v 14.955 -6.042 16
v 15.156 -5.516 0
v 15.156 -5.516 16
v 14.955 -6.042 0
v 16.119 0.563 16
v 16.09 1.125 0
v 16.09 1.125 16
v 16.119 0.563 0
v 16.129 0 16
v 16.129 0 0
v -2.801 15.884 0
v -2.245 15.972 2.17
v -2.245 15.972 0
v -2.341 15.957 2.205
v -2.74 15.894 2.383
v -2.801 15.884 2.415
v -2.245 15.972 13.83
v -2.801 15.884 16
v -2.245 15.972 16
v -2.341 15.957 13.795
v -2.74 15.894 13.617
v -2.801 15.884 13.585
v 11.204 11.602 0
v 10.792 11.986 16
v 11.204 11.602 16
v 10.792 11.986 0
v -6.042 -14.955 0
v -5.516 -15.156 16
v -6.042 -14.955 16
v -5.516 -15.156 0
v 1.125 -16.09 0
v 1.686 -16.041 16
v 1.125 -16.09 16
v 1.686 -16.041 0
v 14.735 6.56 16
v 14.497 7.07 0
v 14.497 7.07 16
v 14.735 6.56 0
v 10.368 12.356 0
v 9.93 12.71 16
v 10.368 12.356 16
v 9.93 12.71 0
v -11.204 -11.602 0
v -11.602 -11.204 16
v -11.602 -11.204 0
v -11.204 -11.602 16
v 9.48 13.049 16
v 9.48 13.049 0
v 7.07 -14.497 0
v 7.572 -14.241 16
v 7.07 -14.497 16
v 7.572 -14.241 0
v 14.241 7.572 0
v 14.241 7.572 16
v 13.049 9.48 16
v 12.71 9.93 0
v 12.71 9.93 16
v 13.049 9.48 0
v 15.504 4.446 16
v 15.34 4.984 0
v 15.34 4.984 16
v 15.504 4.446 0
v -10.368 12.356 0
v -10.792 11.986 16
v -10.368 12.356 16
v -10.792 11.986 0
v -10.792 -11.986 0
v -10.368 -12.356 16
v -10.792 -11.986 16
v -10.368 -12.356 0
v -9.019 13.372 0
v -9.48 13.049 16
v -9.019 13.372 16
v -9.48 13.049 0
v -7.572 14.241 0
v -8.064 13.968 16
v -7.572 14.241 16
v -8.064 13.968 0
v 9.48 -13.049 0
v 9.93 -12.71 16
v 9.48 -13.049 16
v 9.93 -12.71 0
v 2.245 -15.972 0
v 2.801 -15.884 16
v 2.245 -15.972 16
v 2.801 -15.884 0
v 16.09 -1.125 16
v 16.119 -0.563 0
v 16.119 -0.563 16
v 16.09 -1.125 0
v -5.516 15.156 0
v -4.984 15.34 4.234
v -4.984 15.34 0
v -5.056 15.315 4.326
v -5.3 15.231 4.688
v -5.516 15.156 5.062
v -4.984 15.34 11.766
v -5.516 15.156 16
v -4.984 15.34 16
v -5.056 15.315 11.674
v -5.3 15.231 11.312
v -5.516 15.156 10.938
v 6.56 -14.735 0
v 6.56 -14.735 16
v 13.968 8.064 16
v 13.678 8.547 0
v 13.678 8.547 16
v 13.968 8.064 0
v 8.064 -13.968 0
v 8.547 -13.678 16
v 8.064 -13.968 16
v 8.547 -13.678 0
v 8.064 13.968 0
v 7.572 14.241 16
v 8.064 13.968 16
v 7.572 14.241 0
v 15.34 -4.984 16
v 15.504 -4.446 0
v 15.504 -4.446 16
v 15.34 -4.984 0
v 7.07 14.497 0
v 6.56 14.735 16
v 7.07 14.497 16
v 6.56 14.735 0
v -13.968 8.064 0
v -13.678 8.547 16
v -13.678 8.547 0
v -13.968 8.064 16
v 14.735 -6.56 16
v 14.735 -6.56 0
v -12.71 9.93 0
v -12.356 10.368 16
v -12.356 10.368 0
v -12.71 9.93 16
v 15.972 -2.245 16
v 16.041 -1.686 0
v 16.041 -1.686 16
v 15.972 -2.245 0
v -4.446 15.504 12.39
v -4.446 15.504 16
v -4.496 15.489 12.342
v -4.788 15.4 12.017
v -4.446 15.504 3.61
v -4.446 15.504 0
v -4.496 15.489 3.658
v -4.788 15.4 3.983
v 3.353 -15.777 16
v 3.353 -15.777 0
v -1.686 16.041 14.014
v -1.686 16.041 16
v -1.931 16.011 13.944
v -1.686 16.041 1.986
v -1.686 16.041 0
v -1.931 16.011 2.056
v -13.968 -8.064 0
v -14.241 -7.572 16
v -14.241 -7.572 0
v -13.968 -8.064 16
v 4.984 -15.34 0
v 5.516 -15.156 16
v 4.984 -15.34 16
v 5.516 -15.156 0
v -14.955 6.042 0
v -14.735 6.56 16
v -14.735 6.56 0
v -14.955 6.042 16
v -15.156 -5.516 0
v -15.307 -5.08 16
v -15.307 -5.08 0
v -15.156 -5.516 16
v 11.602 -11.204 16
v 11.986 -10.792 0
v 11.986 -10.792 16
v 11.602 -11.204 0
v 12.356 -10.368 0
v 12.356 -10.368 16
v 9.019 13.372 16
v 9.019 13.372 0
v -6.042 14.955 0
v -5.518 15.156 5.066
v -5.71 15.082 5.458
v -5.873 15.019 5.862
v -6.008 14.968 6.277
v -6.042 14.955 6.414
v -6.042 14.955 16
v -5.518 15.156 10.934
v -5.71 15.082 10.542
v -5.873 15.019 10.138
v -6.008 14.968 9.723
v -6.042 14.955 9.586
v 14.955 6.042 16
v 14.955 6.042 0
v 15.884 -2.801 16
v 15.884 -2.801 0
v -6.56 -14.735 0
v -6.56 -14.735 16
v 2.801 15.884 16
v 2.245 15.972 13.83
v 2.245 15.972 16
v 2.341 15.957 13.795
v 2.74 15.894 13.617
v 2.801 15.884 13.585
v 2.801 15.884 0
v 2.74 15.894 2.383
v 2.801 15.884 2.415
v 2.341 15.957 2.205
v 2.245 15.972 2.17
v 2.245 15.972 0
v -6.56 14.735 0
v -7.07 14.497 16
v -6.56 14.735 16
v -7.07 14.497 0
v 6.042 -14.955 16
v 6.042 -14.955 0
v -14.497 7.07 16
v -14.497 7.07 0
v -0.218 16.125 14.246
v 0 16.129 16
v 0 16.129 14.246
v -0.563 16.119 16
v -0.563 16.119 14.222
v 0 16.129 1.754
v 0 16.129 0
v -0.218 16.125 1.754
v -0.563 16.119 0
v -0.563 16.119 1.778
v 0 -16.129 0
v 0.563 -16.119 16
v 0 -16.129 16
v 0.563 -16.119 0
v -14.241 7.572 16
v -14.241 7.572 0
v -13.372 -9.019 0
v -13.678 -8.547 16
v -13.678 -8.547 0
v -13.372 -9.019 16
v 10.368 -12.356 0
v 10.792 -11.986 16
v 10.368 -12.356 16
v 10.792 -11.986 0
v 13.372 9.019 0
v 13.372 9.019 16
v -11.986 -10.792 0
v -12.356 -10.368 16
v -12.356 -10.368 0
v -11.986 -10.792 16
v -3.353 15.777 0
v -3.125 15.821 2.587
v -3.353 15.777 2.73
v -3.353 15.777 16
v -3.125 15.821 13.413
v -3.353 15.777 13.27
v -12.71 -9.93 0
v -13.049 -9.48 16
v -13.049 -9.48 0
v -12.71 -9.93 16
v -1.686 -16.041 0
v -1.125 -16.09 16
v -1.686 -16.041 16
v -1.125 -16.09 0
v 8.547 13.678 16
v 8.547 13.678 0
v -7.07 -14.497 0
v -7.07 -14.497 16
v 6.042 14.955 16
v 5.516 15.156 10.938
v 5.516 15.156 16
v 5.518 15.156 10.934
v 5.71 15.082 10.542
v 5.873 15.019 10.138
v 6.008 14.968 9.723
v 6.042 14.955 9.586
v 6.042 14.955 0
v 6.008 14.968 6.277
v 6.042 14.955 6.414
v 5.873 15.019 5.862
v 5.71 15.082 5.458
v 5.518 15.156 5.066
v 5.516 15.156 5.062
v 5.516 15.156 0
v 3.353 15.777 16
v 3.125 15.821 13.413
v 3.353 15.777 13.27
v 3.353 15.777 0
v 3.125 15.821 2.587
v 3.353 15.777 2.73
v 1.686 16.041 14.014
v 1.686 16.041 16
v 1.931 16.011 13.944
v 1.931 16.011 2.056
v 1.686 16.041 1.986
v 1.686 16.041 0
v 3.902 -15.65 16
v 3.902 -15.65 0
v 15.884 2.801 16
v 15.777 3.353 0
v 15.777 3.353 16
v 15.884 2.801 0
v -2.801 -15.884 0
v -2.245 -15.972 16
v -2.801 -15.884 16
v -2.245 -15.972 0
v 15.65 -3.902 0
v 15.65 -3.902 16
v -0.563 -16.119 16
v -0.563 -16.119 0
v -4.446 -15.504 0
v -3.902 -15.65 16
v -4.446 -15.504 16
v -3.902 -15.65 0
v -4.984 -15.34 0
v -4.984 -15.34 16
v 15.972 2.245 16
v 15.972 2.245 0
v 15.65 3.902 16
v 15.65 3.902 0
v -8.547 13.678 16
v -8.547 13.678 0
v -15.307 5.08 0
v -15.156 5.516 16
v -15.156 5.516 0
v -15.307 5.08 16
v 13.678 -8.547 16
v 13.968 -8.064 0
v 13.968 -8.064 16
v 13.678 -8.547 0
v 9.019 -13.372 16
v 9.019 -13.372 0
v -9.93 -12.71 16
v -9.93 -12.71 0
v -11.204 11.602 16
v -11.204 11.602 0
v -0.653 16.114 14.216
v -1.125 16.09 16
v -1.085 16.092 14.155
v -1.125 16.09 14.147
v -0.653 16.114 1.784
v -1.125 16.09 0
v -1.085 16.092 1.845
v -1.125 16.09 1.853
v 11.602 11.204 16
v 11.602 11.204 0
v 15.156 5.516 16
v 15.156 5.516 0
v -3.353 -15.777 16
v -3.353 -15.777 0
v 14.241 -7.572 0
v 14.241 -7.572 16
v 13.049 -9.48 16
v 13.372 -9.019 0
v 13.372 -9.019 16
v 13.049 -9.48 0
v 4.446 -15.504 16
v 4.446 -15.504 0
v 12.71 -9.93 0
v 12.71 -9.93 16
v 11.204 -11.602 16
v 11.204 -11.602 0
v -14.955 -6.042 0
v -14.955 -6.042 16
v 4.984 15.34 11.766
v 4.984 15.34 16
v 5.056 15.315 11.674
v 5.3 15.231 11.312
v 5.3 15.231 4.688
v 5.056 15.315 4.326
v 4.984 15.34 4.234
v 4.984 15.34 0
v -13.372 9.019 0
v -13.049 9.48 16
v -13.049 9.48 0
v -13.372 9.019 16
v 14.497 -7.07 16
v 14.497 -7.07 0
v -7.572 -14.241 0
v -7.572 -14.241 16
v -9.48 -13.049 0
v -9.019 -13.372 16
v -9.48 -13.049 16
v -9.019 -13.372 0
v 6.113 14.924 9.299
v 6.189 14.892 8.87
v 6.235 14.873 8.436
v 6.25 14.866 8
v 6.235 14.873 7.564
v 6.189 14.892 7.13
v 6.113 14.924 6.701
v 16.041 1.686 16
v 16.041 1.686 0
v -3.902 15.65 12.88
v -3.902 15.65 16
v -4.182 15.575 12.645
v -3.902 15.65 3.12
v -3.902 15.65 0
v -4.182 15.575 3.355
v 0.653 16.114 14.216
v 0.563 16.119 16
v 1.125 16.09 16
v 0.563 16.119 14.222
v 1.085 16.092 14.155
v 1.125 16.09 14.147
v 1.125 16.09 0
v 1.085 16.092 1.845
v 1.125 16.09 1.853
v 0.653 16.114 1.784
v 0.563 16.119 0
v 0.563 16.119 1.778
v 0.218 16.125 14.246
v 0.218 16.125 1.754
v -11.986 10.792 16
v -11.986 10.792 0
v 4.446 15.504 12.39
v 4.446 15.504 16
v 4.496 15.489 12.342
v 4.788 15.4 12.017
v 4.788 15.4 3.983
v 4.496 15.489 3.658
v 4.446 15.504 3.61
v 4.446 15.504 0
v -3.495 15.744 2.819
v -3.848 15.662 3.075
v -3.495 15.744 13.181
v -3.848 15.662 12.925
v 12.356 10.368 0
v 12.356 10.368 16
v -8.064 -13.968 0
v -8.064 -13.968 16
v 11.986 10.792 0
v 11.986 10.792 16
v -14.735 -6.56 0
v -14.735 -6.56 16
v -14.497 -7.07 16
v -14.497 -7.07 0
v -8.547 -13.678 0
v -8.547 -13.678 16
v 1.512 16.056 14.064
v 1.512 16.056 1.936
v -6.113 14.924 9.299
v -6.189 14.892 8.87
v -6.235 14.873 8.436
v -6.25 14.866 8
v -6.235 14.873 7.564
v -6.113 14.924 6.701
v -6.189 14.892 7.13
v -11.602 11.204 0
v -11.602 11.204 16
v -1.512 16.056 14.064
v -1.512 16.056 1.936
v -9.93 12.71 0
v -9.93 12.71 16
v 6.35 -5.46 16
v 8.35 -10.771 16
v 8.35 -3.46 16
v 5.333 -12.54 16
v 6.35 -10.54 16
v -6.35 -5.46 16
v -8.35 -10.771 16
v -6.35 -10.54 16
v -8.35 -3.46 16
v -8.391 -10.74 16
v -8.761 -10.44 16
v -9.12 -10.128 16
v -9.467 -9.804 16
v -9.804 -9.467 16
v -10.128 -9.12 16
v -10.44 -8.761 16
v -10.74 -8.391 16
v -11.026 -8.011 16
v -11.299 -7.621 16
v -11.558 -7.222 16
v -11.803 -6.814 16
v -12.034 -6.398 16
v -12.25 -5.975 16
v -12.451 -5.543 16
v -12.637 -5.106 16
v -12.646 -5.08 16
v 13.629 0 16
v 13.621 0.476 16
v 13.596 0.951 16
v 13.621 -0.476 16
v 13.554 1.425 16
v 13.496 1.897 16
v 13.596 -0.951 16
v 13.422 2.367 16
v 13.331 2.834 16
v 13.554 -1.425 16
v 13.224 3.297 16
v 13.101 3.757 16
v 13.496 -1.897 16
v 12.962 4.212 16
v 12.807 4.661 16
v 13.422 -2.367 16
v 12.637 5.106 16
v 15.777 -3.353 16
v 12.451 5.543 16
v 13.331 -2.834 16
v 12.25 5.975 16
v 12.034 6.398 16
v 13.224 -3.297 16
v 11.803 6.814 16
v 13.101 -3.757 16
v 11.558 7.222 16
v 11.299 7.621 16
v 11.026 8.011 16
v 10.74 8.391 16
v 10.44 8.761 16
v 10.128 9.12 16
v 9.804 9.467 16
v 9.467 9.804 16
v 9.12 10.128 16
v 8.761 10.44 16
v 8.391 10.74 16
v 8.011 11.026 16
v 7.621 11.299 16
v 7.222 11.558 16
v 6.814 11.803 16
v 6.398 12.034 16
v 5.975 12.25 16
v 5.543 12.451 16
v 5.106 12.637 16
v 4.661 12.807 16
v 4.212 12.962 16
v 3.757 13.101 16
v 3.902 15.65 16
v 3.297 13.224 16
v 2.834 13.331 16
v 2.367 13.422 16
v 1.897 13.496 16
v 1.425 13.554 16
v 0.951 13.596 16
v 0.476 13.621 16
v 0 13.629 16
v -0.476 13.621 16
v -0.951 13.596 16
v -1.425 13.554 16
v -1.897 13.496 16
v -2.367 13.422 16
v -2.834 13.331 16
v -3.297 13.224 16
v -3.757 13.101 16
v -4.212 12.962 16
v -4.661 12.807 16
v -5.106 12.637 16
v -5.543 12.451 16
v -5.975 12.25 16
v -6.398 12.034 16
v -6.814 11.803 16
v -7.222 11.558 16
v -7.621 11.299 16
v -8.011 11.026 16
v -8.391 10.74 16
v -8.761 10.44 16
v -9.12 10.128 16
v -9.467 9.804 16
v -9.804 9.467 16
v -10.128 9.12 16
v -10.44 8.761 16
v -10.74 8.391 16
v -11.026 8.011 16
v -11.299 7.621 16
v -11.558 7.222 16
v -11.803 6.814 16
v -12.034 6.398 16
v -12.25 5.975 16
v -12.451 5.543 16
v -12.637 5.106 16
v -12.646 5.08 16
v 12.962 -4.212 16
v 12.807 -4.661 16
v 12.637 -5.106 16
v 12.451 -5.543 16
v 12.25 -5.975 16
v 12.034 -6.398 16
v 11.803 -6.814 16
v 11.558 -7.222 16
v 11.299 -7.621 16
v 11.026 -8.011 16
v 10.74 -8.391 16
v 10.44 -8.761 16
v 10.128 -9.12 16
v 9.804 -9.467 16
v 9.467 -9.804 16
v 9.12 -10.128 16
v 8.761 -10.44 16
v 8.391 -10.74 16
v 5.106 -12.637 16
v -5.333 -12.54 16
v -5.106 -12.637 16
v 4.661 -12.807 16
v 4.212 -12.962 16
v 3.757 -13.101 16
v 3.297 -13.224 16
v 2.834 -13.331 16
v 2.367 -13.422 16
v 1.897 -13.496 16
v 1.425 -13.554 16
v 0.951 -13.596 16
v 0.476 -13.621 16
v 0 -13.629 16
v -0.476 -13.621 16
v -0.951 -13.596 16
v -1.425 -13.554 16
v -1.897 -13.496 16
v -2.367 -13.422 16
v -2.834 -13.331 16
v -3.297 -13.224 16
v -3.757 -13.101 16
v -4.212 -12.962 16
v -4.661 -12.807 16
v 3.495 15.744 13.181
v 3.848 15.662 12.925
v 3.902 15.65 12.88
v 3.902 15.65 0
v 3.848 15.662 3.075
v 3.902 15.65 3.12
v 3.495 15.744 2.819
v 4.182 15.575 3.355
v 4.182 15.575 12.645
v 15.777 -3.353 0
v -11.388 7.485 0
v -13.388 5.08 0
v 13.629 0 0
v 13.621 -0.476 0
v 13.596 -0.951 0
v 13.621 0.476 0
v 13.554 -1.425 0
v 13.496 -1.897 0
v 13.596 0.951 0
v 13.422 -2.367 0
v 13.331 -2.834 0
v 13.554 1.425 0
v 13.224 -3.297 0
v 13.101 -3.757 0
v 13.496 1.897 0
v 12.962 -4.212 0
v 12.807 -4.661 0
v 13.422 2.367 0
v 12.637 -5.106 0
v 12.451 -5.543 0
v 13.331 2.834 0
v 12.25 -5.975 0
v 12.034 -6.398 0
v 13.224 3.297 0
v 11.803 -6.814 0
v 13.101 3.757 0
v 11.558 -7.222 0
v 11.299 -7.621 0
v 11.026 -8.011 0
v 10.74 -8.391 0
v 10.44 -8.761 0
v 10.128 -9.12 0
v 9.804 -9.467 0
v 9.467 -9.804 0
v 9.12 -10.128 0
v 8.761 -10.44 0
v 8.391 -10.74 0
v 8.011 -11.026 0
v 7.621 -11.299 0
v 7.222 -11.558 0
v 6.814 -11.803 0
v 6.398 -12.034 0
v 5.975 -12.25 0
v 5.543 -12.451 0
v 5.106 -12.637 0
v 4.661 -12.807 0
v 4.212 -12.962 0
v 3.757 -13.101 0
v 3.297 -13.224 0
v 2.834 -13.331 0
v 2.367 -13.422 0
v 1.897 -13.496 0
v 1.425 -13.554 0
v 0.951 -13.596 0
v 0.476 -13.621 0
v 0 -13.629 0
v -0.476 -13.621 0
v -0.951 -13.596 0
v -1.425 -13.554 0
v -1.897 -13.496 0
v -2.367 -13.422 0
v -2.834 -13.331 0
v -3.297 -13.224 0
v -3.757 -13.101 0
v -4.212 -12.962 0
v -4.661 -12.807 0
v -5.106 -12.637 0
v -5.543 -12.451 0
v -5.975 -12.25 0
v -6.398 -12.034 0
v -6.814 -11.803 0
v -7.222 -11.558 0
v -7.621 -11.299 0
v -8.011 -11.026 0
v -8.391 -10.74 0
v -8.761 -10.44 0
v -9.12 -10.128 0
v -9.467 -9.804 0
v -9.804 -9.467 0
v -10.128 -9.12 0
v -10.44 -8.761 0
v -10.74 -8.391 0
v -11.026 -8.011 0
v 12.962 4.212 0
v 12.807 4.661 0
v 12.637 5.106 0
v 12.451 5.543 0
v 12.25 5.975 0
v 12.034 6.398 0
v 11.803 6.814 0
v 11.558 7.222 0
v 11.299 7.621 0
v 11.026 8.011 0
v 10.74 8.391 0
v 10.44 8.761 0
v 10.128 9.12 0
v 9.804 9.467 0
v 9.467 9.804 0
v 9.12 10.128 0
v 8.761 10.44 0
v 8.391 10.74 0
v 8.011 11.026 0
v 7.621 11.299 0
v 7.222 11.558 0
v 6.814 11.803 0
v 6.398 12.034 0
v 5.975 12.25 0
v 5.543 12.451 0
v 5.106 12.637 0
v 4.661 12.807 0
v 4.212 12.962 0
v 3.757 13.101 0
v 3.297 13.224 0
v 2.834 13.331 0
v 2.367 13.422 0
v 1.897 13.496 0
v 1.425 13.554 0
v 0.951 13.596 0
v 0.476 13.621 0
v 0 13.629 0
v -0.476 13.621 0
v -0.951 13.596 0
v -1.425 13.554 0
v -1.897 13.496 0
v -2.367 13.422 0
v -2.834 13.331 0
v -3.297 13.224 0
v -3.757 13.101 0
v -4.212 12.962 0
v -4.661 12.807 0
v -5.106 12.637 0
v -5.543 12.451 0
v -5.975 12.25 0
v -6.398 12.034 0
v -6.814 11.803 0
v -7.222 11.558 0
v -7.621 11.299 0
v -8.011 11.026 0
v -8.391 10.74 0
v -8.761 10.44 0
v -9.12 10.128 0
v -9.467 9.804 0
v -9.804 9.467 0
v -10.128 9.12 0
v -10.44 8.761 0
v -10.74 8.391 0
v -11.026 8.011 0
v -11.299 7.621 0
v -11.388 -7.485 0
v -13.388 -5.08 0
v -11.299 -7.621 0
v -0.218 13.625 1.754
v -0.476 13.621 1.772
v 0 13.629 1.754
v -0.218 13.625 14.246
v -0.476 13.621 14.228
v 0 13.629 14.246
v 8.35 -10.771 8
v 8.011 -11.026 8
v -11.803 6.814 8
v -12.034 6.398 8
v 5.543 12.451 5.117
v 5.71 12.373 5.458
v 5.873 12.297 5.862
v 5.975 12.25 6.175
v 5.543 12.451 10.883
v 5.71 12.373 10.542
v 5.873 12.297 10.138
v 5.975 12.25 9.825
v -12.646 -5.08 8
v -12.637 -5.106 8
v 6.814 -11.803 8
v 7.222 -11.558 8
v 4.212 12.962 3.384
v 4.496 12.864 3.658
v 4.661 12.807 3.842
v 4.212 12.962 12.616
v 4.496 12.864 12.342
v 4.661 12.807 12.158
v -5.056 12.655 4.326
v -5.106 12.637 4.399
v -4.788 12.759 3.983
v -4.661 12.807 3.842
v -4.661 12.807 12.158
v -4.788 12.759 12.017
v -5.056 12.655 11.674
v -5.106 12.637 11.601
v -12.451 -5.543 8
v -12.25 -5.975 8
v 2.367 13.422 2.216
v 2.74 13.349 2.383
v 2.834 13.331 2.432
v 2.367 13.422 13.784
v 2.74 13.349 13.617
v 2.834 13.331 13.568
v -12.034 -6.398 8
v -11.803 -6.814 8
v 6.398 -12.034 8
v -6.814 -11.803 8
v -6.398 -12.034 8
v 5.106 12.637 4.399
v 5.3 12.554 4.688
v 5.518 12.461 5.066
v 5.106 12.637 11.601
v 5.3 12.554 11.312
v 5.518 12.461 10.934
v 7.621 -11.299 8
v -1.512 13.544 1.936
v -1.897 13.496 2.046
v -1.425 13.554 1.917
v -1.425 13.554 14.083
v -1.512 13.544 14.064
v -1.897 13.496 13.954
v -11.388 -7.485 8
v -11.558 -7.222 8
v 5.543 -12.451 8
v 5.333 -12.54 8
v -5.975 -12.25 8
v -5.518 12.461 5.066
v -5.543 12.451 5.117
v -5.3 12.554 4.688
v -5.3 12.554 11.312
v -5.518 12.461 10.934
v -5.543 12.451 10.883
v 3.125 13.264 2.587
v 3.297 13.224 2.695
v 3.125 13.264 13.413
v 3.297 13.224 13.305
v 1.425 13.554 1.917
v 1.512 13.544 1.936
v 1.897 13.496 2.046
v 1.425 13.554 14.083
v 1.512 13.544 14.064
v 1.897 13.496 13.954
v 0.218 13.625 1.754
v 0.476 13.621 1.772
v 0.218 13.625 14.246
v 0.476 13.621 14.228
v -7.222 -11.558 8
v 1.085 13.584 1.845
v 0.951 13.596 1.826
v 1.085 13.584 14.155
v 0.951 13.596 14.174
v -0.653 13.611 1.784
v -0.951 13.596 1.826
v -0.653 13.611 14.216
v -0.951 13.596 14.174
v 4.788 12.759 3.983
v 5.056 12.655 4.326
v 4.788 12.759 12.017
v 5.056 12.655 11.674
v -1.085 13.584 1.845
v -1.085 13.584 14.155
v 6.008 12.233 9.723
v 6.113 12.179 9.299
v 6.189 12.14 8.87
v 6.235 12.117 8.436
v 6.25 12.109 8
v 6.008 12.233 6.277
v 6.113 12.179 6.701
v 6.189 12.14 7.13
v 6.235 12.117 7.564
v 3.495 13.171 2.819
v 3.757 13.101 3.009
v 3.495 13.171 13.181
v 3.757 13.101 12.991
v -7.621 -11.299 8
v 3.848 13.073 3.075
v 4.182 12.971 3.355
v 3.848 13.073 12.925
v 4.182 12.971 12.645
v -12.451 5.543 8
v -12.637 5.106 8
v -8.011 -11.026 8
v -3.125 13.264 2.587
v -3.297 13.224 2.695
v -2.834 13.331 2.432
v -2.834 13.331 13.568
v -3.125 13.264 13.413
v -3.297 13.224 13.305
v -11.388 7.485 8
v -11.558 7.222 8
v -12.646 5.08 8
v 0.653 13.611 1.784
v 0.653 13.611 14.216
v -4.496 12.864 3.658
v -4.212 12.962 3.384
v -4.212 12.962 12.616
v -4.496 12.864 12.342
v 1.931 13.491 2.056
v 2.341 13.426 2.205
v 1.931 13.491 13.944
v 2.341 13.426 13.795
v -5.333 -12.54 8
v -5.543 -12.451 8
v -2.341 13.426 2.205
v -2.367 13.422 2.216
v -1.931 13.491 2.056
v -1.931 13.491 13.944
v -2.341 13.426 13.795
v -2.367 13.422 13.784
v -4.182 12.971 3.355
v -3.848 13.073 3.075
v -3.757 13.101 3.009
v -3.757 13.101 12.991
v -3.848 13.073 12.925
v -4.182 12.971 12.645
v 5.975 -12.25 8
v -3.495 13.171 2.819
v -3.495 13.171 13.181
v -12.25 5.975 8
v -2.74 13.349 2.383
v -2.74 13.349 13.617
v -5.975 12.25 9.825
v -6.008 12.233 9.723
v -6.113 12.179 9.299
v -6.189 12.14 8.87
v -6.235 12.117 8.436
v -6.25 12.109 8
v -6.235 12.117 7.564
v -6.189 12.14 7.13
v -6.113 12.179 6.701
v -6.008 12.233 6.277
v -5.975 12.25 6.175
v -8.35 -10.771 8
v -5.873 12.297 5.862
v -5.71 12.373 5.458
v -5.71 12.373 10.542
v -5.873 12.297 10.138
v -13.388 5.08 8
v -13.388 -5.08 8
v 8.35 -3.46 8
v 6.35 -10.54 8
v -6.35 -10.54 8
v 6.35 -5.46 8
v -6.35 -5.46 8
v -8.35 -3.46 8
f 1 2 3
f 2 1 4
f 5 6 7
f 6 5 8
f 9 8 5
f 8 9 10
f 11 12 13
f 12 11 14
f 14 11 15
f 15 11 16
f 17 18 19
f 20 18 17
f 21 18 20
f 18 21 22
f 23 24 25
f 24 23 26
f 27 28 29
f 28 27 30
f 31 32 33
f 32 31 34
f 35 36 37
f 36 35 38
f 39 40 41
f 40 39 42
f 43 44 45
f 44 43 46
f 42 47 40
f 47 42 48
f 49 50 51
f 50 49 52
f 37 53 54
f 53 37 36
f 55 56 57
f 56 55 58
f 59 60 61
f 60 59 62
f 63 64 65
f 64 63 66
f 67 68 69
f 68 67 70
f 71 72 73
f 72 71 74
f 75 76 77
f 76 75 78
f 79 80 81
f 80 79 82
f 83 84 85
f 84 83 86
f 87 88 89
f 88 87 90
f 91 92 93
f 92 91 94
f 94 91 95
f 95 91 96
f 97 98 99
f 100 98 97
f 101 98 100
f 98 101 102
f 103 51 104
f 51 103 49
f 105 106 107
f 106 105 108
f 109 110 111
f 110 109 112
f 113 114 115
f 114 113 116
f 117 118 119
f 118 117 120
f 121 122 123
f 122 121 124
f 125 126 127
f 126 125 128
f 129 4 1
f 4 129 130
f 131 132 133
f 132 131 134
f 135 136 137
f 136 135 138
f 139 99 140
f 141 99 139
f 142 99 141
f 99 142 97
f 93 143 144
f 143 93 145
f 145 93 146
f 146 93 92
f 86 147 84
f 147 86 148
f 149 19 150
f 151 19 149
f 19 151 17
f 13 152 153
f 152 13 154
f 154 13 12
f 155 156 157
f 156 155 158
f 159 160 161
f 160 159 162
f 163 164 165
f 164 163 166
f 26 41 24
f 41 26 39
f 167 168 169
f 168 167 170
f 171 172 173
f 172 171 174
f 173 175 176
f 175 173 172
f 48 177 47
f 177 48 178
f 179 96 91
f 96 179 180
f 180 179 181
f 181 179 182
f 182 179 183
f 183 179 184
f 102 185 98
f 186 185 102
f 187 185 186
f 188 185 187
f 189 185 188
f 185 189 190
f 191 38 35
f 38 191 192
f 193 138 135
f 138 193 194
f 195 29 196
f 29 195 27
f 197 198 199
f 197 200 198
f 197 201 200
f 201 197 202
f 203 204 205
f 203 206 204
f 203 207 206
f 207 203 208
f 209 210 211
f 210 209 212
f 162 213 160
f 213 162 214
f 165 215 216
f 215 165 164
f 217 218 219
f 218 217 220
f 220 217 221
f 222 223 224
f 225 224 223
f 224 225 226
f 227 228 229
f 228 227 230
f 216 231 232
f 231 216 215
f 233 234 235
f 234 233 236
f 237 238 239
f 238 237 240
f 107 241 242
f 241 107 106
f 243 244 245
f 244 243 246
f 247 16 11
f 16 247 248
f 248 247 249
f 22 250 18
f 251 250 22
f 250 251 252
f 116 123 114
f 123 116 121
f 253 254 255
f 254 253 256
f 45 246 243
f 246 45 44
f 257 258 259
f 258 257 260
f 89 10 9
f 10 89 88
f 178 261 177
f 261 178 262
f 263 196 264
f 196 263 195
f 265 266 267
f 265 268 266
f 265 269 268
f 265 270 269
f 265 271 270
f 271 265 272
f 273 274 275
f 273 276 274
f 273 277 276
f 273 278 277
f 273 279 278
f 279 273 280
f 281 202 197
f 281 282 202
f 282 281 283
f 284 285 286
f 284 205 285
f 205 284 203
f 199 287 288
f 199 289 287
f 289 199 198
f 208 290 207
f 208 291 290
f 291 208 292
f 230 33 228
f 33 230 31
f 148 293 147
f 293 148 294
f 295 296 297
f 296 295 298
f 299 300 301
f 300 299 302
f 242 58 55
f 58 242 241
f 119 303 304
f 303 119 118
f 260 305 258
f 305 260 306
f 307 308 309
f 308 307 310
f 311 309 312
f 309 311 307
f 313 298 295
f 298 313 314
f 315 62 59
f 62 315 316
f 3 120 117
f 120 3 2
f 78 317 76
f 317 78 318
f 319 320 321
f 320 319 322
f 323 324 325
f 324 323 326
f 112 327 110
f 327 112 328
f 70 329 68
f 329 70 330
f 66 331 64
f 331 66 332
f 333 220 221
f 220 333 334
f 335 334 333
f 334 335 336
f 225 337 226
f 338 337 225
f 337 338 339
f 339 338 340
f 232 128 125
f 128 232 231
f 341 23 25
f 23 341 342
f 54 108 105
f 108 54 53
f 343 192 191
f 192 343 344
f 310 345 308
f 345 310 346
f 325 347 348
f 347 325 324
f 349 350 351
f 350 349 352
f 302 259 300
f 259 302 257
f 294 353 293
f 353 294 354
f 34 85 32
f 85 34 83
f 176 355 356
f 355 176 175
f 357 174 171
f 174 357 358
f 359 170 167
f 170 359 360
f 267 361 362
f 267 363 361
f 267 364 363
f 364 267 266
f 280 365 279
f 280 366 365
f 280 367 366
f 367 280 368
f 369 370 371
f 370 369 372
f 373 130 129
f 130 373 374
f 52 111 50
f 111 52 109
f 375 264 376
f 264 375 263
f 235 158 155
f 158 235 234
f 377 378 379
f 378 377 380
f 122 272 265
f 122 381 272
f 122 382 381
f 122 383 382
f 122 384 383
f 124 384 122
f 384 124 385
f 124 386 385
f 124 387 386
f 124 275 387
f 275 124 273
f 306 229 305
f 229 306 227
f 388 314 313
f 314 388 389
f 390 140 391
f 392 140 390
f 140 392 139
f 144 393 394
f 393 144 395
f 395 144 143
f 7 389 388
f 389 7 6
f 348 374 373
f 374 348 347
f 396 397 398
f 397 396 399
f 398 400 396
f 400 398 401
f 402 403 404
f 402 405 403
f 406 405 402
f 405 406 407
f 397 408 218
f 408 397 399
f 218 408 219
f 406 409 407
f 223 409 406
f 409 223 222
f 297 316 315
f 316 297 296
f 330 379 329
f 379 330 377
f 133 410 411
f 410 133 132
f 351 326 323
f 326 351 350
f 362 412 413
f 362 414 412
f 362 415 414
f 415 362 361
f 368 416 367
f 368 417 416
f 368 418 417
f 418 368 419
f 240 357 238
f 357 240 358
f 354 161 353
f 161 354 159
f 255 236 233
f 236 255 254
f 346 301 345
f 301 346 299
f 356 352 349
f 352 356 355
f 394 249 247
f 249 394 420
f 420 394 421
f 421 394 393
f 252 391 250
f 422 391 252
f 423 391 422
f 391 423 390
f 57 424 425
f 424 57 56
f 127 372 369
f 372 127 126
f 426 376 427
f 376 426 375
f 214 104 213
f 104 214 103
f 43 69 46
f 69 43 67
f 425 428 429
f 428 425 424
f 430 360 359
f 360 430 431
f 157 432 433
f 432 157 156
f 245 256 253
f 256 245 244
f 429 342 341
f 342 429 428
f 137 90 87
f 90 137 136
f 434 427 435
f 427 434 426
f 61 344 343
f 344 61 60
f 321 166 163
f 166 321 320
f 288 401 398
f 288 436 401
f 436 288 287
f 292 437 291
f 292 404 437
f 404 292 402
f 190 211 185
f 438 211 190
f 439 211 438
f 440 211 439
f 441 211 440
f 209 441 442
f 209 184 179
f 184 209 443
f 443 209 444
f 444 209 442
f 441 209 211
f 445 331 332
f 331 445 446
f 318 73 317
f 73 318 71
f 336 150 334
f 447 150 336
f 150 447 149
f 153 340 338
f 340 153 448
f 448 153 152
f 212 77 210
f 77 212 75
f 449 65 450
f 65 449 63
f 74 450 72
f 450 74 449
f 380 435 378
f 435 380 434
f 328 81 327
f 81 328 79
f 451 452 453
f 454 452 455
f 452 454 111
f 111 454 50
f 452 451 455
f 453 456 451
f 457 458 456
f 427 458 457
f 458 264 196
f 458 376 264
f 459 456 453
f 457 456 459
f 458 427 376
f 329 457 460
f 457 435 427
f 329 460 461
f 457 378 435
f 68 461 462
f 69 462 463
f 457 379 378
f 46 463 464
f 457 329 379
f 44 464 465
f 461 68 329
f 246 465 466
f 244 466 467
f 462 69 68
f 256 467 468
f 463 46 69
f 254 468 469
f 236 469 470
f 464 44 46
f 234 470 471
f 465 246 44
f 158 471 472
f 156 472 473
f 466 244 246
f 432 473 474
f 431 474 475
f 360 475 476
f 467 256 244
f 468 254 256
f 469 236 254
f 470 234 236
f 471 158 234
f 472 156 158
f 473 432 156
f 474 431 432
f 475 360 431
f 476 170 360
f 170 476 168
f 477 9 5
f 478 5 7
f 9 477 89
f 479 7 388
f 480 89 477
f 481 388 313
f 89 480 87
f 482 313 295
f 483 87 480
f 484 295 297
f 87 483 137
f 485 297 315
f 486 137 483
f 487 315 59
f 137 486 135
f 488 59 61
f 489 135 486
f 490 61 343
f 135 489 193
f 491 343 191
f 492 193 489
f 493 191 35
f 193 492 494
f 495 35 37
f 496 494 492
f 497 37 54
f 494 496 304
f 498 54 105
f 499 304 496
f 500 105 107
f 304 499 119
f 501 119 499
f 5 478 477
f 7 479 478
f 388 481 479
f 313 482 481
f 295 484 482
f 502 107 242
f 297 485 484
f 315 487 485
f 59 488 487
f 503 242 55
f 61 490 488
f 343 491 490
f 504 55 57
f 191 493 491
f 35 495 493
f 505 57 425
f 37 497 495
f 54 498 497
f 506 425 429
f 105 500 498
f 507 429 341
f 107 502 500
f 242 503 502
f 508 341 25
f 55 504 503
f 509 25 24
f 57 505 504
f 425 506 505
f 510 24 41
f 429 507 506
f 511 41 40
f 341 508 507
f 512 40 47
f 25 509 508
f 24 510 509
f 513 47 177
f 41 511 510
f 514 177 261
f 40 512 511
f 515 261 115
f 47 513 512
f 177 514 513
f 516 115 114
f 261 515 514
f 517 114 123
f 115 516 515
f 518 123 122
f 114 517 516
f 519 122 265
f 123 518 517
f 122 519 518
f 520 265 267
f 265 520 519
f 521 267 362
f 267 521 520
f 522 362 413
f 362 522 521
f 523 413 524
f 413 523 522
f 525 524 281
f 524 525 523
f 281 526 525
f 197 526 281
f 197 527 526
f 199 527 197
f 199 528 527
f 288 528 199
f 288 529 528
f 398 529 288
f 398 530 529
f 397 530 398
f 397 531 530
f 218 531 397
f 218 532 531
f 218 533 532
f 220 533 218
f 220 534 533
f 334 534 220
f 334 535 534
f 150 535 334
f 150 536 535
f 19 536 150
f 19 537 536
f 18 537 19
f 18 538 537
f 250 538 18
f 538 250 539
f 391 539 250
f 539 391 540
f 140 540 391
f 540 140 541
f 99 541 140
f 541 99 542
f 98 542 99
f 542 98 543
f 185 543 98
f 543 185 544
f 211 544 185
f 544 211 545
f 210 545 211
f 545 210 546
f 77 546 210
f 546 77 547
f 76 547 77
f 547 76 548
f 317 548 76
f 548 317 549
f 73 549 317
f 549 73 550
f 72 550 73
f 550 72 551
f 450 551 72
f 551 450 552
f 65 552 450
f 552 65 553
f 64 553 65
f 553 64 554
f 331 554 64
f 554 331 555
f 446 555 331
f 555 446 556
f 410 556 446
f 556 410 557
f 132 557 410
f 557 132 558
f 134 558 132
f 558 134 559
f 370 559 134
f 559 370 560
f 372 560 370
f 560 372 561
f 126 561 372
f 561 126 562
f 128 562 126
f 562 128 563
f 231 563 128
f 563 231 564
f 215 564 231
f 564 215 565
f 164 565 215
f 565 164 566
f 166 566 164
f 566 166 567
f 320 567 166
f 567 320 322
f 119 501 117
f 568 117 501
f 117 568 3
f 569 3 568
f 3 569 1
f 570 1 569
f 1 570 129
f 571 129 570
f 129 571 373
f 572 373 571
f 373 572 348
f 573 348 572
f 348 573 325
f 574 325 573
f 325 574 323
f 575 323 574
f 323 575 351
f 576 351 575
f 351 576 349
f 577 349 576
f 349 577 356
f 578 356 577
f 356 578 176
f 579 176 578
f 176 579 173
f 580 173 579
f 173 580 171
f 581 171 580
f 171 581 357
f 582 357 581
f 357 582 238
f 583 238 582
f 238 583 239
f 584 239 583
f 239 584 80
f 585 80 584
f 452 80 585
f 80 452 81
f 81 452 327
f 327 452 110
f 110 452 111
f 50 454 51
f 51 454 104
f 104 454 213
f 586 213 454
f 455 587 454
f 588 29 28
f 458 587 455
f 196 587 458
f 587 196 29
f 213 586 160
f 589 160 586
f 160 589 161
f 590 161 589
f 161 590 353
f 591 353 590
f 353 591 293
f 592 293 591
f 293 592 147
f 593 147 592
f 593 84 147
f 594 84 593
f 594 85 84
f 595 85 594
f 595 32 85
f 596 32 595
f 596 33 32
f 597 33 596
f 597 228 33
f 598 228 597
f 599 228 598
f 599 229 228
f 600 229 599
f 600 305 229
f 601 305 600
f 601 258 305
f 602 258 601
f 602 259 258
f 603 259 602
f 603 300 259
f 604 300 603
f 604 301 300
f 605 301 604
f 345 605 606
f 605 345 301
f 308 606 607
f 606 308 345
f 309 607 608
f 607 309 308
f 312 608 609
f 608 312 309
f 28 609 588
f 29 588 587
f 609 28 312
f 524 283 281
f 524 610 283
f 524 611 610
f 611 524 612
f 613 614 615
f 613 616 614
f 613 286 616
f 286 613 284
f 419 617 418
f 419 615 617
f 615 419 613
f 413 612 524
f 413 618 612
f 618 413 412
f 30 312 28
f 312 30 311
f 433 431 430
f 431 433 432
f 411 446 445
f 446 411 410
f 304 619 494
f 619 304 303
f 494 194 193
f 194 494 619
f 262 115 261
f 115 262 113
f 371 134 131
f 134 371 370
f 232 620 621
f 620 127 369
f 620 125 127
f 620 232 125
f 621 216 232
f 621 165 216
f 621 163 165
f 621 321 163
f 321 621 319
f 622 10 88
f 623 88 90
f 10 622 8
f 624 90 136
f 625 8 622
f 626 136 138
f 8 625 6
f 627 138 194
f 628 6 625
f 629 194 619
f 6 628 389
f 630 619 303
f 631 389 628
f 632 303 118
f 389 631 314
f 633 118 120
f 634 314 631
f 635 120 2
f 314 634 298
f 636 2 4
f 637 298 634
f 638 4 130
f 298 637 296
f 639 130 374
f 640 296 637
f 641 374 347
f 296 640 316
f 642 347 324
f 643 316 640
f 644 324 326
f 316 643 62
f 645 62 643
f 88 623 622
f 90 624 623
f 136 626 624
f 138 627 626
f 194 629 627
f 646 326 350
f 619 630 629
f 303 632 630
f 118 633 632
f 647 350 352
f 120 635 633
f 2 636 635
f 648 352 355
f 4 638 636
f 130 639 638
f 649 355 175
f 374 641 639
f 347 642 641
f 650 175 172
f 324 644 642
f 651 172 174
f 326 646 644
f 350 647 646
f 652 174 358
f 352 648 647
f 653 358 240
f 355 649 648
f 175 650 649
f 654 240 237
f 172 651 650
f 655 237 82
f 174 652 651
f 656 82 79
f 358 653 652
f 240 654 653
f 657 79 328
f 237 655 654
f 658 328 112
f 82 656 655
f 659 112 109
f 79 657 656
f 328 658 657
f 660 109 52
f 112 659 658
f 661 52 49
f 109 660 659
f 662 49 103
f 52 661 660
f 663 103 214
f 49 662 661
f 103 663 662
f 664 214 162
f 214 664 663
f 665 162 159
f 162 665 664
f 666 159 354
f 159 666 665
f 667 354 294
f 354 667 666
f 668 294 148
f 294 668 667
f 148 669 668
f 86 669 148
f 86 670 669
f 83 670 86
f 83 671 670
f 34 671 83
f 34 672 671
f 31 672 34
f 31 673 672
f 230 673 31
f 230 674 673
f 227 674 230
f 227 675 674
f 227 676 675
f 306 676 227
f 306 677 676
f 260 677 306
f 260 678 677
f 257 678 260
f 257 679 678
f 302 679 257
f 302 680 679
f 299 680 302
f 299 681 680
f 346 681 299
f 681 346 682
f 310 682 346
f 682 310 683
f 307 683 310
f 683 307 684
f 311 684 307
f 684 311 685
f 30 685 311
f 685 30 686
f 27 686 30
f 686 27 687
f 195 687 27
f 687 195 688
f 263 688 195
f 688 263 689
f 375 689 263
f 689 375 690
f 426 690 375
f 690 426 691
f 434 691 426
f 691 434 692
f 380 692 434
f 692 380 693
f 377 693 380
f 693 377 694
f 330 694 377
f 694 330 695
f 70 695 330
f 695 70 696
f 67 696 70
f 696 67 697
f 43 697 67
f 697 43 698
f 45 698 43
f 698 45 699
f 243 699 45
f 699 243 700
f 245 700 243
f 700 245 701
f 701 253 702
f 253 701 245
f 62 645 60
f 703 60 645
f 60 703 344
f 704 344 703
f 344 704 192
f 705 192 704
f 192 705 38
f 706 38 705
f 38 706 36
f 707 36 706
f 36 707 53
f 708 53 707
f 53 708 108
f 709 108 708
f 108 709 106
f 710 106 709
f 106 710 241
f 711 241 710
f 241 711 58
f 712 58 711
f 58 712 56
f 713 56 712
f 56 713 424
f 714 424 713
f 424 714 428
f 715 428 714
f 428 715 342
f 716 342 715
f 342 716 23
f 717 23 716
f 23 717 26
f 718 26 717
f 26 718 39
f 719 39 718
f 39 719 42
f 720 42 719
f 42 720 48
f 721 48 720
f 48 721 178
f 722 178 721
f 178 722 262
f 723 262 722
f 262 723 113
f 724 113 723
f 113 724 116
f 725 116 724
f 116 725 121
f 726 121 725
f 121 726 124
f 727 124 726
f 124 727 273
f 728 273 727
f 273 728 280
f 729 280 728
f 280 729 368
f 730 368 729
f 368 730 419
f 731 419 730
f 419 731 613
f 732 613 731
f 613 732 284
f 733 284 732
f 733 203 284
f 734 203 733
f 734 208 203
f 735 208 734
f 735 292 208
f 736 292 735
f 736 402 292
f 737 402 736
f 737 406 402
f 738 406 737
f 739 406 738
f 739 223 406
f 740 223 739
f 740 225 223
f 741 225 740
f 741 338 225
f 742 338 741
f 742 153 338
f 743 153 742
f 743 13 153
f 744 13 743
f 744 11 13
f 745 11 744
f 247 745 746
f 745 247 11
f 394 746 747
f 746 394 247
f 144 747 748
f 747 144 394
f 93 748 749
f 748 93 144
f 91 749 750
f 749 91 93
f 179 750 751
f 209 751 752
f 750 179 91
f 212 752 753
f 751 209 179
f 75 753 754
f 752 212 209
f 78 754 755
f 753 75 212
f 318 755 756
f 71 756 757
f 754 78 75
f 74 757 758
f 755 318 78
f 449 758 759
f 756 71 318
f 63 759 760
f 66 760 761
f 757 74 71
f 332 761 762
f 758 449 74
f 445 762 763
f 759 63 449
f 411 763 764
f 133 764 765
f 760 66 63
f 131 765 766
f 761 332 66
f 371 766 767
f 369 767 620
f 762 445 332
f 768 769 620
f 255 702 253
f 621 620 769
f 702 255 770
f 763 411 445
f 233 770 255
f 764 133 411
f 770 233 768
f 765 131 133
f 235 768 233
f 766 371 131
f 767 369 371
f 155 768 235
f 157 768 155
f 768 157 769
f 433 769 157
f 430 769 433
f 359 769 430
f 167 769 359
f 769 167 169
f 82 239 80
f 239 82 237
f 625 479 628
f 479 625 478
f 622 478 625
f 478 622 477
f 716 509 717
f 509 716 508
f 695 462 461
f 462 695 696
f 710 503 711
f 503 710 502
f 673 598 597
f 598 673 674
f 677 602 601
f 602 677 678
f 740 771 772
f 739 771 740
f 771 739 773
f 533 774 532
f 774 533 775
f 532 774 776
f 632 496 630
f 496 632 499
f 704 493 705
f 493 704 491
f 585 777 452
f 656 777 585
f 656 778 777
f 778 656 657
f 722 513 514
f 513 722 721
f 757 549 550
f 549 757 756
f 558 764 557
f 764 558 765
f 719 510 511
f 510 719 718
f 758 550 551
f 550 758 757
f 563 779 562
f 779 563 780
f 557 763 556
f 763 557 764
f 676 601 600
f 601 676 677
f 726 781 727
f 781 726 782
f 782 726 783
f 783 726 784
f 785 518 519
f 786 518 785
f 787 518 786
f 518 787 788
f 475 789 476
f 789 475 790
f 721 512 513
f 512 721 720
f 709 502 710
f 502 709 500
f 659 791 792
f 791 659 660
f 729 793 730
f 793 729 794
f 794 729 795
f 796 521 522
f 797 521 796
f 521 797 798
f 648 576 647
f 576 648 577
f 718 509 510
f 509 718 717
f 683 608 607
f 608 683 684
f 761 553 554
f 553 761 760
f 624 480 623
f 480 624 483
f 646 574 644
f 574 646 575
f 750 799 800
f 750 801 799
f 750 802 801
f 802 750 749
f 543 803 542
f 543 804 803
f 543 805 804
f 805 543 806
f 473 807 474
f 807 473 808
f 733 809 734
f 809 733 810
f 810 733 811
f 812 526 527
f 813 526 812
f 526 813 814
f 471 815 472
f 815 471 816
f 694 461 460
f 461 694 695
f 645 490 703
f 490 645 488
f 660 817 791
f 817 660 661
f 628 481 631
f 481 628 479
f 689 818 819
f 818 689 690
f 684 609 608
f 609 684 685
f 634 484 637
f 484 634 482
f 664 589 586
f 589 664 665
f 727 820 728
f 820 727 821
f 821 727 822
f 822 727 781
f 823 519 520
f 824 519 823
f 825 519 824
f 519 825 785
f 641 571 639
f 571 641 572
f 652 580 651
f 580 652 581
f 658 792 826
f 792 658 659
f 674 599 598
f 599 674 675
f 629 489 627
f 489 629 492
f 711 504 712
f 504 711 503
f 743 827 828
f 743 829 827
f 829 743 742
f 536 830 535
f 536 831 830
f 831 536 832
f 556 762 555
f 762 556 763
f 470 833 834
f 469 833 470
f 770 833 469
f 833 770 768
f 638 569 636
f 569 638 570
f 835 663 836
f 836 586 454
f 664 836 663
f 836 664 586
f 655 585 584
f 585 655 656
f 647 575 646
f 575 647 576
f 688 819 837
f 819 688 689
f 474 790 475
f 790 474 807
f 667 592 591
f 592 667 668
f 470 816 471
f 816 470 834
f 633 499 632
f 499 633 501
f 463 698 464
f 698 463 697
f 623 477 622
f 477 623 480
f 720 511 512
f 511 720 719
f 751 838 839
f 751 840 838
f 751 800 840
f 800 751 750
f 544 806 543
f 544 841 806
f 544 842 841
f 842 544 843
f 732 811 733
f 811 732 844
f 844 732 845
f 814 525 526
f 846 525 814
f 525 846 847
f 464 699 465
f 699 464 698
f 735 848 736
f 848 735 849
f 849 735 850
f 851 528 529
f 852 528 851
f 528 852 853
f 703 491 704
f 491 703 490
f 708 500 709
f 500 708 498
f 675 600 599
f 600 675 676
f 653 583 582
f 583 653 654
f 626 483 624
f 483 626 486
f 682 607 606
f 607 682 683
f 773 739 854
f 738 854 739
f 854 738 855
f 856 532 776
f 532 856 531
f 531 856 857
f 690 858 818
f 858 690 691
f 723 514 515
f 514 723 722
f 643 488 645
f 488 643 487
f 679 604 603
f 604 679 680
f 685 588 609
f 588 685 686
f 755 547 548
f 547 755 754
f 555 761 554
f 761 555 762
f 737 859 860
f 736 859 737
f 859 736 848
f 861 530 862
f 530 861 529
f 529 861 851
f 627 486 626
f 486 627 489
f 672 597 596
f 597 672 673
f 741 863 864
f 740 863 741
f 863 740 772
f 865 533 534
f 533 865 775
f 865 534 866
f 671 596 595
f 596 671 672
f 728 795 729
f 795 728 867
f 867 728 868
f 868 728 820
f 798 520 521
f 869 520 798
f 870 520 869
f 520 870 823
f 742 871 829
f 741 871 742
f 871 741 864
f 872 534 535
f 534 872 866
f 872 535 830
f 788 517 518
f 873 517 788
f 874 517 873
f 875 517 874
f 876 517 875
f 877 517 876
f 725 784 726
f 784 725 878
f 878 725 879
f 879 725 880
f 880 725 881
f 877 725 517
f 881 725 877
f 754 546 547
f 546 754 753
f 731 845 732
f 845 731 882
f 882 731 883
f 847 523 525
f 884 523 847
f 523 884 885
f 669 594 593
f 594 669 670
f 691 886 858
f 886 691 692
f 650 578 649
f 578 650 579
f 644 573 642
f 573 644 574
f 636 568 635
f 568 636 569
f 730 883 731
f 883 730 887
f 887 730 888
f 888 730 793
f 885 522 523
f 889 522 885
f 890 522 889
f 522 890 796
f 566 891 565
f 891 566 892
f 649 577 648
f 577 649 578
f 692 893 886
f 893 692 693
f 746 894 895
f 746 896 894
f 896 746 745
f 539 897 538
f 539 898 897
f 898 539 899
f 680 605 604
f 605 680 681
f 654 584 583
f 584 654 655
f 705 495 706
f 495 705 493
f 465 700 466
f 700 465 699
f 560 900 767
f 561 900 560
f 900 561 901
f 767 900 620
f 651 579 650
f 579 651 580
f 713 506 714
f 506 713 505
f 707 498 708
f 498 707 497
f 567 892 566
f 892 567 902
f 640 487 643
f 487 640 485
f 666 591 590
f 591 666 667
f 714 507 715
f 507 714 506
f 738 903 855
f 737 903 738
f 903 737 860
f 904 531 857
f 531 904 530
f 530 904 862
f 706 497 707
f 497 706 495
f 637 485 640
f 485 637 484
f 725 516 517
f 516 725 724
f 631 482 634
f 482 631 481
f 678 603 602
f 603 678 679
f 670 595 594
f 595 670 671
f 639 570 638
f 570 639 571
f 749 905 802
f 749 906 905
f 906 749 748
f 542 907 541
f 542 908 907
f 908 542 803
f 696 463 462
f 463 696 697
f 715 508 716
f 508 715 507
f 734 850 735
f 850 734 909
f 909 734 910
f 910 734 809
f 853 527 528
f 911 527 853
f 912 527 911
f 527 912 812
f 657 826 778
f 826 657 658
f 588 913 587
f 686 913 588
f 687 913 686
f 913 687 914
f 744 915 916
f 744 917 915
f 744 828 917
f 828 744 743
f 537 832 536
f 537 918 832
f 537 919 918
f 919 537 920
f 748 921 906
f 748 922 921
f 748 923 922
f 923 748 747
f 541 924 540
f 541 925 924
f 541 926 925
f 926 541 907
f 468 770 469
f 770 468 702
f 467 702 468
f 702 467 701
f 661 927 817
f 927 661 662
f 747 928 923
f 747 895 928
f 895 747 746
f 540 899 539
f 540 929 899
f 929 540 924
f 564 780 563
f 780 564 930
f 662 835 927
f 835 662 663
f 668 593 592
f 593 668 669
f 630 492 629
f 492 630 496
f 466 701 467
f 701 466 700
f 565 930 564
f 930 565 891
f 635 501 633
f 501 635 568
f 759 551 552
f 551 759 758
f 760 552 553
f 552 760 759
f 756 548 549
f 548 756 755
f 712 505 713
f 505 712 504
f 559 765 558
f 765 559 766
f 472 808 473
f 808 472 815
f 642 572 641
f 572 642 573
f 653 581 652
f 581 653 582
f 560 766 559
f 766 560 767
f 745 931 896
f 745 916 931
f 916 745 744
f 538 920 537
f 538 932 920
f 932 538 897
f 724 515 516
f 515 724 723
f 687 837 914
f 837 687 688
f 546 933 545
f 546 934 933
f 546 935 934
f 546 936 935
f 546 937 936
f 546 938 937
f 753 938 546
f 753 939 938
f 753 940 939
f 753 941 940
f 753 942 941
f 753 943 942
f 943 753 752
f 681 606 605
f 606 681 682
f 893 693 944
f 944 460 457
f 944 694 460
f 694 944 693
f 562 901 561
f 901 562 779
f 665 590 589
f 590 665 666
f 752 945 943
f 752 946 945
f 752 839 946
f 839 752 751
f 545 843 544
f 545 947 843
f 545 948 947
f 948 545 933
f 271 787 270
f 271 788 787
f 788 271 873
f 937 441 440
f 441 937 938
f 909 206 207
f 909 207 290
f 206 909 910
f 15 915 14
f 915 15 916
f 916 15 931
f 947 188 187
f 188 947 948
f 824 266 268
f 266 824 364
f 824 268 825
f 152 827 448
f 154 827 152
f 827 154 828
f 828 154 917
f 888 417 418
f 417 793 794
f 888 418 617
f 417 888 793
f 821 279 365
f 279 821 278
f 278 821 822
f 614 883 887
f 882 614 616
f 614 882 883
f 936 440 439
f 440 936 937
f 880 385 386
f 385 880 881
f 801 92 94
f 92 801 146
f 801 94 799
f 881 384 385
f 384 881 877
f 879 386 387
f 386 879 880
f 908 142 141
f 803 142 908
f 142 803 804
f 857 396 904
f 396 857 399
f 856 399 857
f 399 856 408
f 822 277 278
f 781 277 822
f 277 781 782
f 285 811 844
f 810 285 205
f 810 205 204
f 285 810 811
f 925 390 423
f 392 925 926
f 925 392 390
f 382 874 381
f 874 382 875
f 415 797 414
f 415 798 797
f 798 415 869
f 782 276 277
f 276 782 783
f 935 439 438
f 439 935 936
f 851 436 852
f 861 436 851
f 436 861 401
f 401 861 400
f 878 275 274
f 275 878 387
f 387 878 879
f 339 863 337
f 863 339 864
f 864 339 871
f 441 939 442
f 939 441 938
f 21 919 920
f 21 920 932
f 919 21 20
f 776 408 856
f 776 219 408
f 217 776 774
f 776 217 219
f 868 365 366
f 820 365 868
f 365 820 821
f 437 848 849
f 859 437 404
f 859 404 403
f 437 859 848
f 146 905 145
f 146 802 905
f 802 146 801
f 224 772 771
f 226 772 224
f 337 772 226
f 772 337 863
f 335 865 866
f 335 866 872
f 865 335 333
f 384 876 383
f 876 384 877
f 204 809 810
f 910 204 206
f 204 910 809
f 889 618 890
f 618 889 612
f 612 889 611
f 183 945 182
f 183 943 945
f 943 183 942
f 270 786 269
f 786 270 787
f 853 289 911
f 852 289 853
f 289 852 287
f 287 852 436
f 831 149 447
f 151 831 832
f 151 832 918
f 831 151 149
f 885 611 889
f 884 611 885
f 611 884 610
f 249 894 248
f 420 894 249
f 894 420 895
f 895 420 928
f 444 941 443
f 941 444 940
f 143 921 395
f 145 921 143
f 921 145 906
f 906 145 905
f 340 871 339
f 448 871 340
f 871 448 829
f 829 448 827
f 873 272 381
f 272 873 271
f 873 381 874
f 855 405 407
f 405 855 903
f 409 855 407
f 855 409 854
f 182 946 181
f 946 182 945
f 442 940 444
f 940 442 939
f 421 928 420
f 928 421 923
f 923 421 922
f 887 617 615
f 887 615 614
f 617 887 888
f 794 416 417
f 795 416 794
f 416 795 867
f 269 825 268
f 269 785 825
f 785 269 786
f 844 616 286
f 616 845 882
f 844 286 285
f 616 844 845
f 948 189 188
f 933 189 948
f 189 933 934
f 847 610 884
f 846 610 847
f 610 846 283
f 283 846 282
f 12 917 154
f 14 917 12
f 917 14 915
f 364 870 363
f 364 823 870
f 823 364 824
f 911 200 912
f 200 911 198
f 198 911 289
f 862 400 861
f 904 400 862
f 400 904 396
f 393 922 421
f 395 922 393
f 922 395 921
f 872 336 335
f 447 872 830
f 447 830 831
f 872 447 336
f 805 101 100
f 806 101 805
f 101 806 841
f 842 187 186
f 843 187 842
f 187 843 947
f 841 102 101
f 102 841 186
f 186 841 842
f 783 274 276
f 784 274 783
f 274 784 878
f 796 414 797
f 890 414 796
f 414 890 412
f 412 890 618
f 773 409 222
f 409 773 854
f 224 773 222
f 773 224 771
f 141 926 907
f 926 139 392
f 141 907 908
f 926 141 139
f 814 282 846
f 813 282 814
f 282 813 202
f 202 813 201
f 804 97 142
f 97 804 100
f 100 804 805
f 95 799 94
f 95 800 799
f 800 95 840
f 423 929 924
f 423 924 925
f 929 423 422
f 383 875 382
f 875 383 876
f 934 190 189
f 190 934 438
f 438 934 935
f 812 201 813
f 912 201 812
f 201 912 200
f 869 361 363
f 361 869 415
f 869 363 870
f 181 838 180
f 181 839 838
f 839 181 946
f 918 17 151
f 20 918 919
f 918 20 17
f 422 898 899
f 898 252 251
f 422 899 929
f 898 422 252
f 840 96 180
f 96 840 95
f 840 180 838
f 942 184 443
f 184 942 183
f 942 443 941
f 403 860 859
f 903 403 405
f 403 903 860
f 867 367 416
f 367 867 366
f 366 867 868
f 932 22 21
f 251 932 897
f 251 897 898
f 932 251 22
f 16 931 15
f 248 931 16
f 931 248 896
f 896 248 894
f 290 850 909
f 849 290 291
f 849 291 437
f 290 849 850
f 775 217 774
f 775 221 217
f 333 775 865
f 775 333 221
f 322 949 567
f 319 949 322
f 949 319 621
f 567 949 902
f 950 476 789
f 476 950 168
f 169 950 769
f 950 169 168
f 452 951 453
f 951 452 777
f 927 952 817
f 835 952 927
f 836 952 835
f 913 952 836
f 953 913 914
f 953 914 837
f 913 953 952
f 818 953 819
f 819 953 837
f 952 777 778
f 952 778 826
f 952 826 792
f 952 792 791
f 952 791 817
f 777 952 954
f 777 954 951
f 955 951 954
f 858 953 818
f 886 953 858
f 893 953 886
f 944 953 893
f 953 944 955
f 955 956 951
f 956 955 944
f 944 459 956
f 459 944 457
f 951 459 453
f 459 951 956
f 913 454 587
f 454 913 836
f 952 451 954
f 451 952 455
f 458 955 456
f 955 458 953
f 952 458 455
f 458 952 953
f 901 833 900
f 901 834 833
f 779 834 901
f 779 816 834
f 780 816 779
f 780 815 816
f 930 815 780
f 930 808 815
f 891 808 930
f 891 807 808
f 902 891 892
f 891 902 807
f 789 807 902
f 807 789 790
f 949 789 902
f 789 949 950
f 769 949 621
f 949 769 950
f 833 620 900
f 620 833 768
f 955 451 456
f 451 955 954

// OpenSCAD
// file: dim.scad
FACES = 180;
EPSILON = 0.1;
VERSION_MAJOR = 1;
VERSION_MINOR = 0;

INCHES_TO_MM = 25.4;
MM_TO_INCHES = 1 / INCHES_TO_MM;

// inner diameter of the lightsaber tube.
// shock is constant, within tolerances
D_INNER      		= 32.258;    // 1.225 -> 1.250 -> 1.270
R_INNER = D_INNER / 2;

// dimensions of the main ring.
H_RING = 16;
T_RING = 2.5;

// dimensions of pin holders and pins
PIN	   = 2.54;
H_PIN_HOLDER = 8;
T_PIN_HOLDER_WALL = 2;

// Pin counts:
X_EMITTER = 4;
Y_EMITTER = 1;


H_BUTTRESS			= 0.175 * INCHES_TO_MM;
D_BATTERY			= 0.732 * INCHES_TO_MM;

W_PCB				= 0.70 * INCHES_TO_MM;
H_PCB				= 0.08 * INCHES_TO_MM;

W_OUTER_DISPLAY		= 0.91 * INCHES_TO_MM;
W_INNER_DISPLAY		= 0.47 * INCHES_TO_MM;
H_OUTER_DISPLAY		= 0.08 * INCHES_TO_MM;
H_INNER_DISPLAY		= 0.14 * INCHES_TO_MM;

D_SWITCH			= 12.5;						// actually 12, by thread.

D_ROD				= 0.160 * INCHES_TO_MM;
ROD_GAP 			= 0.050 * INCHES_TO_MM;

OFFSET_EMITTER = -PIN + sqrt(R_INNER * R_INNER - PIN * PIN * Y_EMITTER * Y_EMITTER);

module emitterPin(h)
{
    translate([-X_EMITTER * PIN / 2, OFFSET_EMITTER, 0]) {
        cube([X_EMITTER * PIN, PIN, h]);
    }	
}
// file: ../shapes.scad
FACES = 180;
EPSILON = 0.1;

module tube(_h, _rInner, _rOuter) {
	difference() {
		cylinder(h=_h, r=_rOuter, $fn=FACES);
		translate([0,0,-EPSILON]) {
			cylinder(h=_h + EPSILON*2, r=_rInner, $fn=FACES);
		}
	}
}

module shelf(_r0, _h, _r1) {
	rotate_extrude($fn=FACES) {
		polygon([[_r0, 0], [_r1, _h], [_r0, _h]]);
	}
}
// main file
use <../threads.scad>
use <../shapes.scad>
include <dim.scad>

$fn = 90;

X_MC = 5;
Y_MC = 2;
OFFSET_MC = 8;
	
module port(xPins, yPins, drawOuter)
{
	INNER_WIDTH  = xPins * PIN;
	INNER_HEIGHT = yPins * PIN;
	OUTER_WIDTH  = INNER_WIDTH  + T_PIN_HOLDER_WALL * 2;
	OUTER_HEIGHT = INNER_HEIGHT + T_PIN_HOLDER_WALL * 2; 

	translate([-OUTER_WIDTH/2, -OUTER_HEIGHT/2, 0]) {
		if (drawOuter) {
			difference() {
				cube(size=[OUTER_WIDTH, OUTER_HEIGHT, H_PIN_HOLDER]);
				translate([T_PIN_HOLDER_WALL, T_PIN_HOLDER_WALL, -1]) {
					cube(size=[INNER_WIDTH, INNER_HEIGHT, H_PIN_HOLDER + 2]);
				}
			}
		}	
		else {
			translate([T_PIN_HOLDER_WALL, T_PIN_HOLDER_WALL, -10]) {
				cube(size=[INNER_WIDTH, INNER_HEIGHT, H_PIN_HOLDER + 20]);
			}
		}
	}
}

difference() 
{
	union() {
		difference() {
			tube(H_RING, D_INNER/2 - T_RING, D_INNER/2);
			translate([0, 0, H_RING/2]) {
				rotate([-90, 0, 0]) {
					cylinder(d=D_SWITCH, h=D_INNER/2 + 1);
				}
			}
            rotate([0, 0, 90]) {
                translate([-X_EMITTER * PIN / 2, 0, -1]) {
                    cube([X_EMITTER * PIN, 40, 20]);
                }                
            }
		}

		intersection() {
			cylinder(h=H_RING, d=D_INNER);

			union() {
				// Microcontroller port.
				translate([0, -OFFSET_MC, H_RING - H_PIN_HOLDER]) {
					port(X_MC, Y_MC, true);
				}
				// Emitter port.
                rotate([0, 0, 90]) {
                    translate([-20, OFFSET_EMITTER - T_PIN_HOLDER_WALL, 0]) {
                        cube([40, T_PIN_HOLDER_WALL, H_PIN_HOLDER]);
                        
                    }
                }                
			}	
		}

	}

	// Punch Microcontroller Port
	translate([0, -OFFSET_MC, H_RING - H_PIN_HOLDER]) {
		port(X_MC, Y_MC, false);
	}
	// Punch emitter port.
	*rotate([0, 0, 90]) {
		translate([-X_EMITTER * PIN / 2, OFFSET_EMITTER, -1]) {
			cube([X_EMITTER * PIN, Y_EMITTER * PIN, 20]);
		}
	}
}

*color("green") {
	translate([0, 0, H_RING/2]) {
		rotate([-90, 0, 0]) {
			cylinder(d=D_SWITCH, h=D_INNER/2 + 1);
		}
	}
}
